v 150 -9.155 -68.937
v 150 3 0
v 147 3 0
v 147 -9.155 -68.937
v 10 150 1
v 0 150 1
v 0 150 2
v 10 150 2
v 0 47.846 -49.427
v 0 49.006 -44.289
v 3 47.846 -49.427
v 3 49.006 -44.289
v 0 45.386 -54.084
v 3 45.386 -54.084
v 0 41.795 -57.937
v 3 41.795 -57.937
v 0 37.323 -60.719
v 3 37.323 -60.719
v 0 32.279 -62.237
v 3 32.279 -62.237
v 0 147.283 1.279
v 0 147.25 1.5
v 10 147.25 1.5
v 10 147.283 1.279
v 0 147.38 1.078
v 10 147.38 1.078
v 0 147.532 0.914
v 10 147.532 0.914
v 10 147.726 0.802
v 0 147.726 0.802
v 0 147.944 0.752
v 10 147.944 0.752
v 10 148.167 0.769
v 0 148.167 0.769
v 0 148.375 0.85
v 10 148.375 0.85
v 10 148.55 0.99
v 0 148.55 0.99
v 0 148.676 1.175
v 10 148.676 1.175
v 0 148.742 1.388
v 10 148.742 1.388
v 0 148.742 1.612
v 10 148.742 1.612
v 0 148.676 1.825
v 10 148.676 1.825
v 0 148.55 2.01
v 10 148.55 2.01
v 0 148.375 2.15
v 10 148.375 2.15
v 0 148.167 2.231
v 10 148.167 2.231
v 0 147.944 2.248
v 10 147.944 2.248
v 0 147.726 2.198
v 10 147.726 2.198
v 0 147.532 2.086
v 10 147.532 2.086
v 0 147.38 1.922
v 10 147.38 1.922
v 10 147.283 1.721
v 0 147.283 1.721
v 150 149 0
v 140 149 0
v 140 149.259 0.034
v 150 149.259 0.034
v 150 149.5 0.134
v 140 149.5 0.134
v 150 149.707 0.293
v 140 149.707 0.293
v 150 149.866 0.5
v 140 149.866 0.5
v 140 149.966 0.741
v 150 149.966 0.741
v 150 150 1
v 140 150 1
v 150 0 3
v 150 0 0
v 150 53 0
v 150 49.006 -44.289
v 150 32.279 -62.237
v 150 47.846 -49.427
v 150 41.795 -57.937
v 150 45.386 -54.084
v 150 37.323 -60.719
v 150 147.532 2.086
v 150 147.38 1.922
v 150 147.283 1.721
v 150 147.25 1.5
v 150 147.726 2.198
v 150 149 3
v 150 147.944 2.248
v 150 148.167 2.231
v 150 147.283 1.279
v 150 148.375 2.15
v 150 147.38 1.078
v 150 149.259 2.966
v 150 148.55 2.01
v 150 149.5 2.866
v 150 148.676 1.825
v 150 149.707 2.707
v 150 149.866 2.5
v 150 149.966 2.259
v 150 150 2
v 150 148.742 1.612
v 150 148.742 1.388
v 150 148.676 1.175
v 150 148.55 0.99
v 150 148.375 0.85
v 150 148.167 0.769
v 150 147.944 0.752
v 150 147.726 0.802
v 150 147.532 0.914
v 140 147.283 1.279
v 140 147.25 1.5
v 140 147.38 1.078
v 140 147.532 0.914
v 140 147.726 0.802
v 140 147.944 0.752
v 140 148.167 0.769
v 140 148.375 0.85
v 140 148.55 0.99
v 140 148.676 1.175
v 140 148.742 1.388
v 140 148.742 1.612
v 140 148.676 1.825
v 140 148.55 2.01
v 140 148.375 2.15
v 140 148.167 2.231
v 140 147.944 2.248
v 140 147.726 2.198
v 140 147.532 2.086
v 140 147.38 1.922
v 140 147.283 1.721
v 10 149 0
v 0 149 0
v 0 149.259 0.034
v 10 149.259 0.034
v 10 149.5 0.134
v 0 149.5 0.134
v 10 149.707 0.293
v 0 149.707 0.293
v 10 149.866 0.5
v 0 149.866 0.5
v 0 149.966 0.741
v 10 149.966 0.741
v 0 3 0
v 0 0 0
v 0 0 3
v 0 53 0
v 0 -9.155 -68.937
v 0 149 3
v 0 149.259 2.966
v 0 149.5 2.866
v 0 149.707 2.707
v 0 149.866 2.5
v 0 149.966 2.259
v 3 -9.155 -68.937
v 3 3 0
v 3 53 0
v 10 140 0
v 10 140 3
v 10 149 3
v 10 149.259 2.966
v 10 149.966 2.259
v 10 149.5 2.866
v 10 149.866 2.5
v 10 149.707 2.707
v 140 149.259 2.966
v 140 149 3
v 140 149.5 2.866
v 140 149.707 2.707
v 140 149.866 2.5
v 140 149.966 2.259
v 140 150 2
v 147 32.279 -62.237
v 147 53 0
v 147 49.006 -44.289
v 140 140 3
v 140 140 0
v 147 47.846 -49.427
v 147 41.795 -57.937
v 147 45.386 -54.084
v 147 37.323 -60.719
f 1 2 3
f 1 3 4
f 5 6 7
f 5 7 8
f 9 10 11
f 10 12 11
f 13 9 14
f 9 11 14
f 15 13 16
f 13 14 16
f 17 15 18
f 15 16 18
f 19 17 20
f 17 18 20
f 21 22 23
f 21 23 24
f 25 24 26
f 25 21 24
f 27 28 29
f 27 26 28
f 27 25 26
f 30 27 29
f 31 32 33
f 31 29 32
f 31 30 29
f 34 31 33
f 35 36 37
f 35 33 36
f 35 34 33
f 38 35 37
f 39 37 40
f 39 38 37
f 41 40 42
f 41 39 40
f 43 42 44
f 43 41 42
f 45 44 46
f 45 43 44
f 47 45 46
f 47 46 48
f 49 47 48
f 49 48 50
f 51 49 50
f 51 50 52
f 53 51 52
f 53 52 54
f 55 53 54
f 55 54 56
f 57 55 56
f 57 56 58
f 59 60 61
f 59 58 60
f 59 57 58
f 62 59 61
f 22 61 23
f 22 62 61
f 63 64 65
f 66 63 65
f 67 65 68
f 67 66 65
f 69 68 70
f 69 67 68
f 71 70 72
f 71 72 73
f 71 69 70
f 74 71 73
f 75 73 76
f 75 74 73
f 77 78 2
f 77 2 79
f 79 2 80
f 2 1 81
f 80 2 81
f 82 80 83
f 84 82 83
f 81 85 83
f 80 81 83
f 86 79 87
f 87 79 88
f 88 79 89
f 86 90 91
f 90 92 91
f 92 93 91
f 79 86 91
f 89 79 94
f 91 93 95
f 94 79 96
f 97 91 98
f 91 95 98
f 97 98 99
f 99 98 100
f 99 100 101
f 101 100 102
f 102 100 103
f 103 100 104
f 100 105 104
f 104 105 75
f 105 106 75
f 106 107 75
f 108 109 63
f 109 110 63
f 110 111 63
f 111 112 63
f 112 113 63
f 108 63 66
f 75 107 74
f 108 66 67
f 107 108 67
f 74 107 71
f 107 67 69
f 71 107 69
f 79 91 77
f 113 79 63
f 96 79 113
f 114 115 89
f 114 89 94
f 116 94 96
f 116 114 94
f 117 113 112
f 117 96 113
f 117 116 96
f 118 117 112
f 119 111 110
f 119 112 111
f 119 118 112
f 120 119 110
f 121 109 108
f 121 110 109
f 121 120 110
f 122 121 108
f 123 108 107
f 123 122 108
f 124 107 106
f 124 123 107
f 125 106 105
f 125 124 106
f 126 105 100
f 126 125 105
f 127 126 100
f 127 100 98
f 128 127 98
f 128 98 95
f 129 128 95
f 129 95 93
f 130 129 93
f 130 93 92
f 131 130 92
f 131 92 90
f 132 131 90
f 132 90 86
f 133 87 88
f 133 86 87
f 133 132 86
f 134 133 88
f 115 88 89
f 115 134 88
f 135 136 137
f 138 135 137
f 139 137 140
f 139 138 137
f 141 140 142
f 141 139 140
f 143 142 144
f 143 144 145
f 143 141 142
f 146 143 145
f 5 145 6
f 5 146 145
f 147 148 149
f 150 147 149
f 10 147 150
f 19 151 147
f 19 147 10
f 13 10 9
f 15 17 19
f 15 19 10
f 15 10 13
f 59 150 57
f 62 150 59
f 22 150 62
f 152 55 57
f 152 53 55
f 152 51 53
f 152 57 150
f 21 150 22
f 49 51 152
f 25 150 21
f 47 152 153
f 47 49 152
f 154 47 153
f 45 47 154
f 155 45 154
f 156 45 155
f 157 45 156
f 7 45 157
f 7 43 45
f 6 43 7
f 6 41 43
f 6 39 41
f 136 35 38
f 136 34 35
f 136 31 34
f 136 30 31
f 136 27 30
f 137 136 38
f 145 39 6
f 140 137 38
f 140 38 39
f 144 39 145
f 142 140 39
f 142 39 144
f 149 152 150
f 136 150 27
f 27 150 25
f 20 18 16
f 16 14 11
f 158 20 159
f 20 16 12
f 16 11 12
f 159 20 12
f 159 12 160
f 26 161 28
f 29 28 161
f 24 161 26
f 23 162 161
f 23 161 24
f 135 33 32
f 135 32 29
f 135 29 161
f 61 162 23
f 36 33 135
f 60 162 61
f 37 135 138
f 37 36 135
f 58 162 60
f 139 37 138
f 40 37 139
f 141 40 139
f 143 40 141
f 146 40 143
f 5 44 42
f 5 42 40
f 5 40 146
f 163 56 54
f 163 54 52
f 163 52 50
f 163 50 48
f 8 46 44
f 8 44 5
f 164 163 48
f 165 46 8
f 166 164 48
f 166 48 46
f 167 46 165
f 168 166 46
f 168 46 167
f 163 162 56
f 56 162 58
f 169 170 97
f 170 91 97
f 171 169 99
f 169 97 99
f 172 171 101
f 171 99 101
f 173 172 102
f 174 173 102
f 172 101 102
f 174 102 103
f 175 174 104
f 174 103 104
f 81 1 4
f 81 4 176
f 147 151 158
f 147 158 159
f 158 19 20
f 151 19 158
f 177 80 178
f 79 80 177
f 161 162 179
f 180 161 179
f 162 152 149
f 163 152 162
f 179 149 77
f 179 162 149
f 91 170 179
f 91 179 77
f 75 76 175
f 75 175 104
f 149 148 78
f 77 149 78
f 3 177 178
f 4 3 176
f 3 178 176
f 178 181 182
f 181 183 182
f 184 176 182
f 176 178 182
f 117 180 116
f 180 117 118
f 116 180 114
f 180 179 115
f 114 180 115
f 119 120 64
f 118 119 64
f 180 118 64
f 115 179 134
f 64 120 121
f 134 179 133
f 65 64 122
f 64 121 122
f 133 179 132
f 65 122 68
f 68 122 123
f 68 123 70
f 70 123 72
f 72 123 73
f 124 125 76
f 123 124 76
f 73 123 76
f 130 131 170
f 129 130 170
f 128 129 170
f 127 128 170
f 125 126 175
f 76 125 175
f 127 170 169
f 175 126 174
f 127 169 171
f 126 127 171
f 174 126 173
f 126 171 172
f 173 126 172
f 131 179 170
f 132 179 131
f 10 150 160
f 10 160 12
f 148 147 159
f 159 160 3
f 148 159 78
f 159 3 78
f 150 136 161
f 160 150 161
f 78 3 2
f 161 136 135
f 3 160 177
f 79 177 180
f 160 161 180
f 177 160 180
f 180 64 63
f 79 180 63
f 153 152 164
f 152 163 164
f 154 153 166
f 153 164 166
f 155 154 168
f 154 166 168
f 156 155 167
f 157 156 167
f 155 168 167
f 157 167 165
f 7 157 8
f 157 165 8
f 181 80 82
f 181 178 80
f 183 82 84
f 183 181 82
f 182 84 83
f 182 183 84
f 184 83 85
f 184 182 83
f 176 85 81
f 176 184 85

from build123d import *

# Parameters (mm, degrees)
ESQUISSE1_W                  = 150
ESQUISSE1_H                  = 150
BOSS_EXTRU_1_DEPTH           = 3
ESQUISSE3_W                  = 130
ESQUISSE3_H                  = 10
ENL_V_MAT_EXTRU_1_DEPTH      = 3
ENL_V_MAT_EXTRU_2_DEPTH      = 153
ENL_V_MAT_EXTRU_2_DEPTH_BACK = 200
ESQUISSE4_R                  = 0.75
CONG_1_R                     = 1
BOSS_EXTRU_5_DEPTH           = 3
BOSS_EXTRU_6_DEPTH           = 3
CONG_4_R                     = 20


with BuildPart() as part:
    # Esquisse1 → Boss.-Extru.1 (new body)
    with BuildSketch(Plane.XY):
        with Locations((75, 75)):
            Rectangle(ESQUISSE1_W, ESQUISSE1_H)
    extrude(amount=BOSS_EXTRU_1_DEPTH)

    # Esquisse3 → Enlèv. mat.-Extru.1 (cut)
    with BuildSketch(Plane.XY.offset(3)):
        with Locations((75, 145)):
            Rectangle(ESQUISSE3_W, ESQUISSE3_H)
    extrude(amount=-ENL_V_MAT_EXTRU_1_DEPTH, mode=Mode.SUBTRACT)

    # Esquisse4 → Enlèv. mat.-Extru.2 (cut, two sides: drawn at the far end of the back side and taken through both)
    with BuildSketch(Plane(origin=(10, 0, 0), x_dir=(0, 0, -1), z_dir=(1, 0, 0)).offset(-ENL_V_MAT_EXTRU_2_DEPTH_BACK)):
        with Locations(Location((-1.5, 148, 0), (0, 0, 270))):
            Circle(ESQUISSE4_R)
    extrude(amount=ENL_V_MAT_EXTRU_2_DEPTH + ENL_V_MAT_EXTRU_2_DEPTH_BACK, mode=Mode.SUBTRACT)

    # Congé1
    cong_1_edges = [part.edges().sort_by_distance(p)[0] for p in [
        (145, 150, 3),
        (5, 150, 0),
        (5, 150, 3),
        (145, 150, 0),
    ]]
    fillet(cong_1_edges, radius=CONG_1_R)

    # Esquisse8 → Boss.-Extru.5 (add)
    with BuildSketch(Plane(origin=(150, 0, 0), x_dir=(0, 0, -1), z_dir=(1, 0, 0))):
        Polygon((0, 3), (68.936542711, -9.155372437), (59.757502948, 47.611044498), (0, 53), align=None)
    extrude(amount=-BOSS_EXTRU_5_DEPTH)

    # Esquisse9 → Boss.-Extru.6 (add)
    with BuildSketch(Plane.ZY):
        Polygon((0, 53), (-59.757502948, 47.611044498), (-68.936542711, -9.155372437), (0, 3), align=None)
    extrude(amount=-BOSS_EXTRU_6_DEPTH)

    # Congé4
    cong_4_edges = [part.edges().sort_by_distance(p)[0] for p in [
        (148.5, 47.611044498, -59.757502948),
        (1.5, 47.611044498, -59.757502948),
    ]]
    fillet(cong_4_edges, radius=CONG_4_R)


solid = part.part
